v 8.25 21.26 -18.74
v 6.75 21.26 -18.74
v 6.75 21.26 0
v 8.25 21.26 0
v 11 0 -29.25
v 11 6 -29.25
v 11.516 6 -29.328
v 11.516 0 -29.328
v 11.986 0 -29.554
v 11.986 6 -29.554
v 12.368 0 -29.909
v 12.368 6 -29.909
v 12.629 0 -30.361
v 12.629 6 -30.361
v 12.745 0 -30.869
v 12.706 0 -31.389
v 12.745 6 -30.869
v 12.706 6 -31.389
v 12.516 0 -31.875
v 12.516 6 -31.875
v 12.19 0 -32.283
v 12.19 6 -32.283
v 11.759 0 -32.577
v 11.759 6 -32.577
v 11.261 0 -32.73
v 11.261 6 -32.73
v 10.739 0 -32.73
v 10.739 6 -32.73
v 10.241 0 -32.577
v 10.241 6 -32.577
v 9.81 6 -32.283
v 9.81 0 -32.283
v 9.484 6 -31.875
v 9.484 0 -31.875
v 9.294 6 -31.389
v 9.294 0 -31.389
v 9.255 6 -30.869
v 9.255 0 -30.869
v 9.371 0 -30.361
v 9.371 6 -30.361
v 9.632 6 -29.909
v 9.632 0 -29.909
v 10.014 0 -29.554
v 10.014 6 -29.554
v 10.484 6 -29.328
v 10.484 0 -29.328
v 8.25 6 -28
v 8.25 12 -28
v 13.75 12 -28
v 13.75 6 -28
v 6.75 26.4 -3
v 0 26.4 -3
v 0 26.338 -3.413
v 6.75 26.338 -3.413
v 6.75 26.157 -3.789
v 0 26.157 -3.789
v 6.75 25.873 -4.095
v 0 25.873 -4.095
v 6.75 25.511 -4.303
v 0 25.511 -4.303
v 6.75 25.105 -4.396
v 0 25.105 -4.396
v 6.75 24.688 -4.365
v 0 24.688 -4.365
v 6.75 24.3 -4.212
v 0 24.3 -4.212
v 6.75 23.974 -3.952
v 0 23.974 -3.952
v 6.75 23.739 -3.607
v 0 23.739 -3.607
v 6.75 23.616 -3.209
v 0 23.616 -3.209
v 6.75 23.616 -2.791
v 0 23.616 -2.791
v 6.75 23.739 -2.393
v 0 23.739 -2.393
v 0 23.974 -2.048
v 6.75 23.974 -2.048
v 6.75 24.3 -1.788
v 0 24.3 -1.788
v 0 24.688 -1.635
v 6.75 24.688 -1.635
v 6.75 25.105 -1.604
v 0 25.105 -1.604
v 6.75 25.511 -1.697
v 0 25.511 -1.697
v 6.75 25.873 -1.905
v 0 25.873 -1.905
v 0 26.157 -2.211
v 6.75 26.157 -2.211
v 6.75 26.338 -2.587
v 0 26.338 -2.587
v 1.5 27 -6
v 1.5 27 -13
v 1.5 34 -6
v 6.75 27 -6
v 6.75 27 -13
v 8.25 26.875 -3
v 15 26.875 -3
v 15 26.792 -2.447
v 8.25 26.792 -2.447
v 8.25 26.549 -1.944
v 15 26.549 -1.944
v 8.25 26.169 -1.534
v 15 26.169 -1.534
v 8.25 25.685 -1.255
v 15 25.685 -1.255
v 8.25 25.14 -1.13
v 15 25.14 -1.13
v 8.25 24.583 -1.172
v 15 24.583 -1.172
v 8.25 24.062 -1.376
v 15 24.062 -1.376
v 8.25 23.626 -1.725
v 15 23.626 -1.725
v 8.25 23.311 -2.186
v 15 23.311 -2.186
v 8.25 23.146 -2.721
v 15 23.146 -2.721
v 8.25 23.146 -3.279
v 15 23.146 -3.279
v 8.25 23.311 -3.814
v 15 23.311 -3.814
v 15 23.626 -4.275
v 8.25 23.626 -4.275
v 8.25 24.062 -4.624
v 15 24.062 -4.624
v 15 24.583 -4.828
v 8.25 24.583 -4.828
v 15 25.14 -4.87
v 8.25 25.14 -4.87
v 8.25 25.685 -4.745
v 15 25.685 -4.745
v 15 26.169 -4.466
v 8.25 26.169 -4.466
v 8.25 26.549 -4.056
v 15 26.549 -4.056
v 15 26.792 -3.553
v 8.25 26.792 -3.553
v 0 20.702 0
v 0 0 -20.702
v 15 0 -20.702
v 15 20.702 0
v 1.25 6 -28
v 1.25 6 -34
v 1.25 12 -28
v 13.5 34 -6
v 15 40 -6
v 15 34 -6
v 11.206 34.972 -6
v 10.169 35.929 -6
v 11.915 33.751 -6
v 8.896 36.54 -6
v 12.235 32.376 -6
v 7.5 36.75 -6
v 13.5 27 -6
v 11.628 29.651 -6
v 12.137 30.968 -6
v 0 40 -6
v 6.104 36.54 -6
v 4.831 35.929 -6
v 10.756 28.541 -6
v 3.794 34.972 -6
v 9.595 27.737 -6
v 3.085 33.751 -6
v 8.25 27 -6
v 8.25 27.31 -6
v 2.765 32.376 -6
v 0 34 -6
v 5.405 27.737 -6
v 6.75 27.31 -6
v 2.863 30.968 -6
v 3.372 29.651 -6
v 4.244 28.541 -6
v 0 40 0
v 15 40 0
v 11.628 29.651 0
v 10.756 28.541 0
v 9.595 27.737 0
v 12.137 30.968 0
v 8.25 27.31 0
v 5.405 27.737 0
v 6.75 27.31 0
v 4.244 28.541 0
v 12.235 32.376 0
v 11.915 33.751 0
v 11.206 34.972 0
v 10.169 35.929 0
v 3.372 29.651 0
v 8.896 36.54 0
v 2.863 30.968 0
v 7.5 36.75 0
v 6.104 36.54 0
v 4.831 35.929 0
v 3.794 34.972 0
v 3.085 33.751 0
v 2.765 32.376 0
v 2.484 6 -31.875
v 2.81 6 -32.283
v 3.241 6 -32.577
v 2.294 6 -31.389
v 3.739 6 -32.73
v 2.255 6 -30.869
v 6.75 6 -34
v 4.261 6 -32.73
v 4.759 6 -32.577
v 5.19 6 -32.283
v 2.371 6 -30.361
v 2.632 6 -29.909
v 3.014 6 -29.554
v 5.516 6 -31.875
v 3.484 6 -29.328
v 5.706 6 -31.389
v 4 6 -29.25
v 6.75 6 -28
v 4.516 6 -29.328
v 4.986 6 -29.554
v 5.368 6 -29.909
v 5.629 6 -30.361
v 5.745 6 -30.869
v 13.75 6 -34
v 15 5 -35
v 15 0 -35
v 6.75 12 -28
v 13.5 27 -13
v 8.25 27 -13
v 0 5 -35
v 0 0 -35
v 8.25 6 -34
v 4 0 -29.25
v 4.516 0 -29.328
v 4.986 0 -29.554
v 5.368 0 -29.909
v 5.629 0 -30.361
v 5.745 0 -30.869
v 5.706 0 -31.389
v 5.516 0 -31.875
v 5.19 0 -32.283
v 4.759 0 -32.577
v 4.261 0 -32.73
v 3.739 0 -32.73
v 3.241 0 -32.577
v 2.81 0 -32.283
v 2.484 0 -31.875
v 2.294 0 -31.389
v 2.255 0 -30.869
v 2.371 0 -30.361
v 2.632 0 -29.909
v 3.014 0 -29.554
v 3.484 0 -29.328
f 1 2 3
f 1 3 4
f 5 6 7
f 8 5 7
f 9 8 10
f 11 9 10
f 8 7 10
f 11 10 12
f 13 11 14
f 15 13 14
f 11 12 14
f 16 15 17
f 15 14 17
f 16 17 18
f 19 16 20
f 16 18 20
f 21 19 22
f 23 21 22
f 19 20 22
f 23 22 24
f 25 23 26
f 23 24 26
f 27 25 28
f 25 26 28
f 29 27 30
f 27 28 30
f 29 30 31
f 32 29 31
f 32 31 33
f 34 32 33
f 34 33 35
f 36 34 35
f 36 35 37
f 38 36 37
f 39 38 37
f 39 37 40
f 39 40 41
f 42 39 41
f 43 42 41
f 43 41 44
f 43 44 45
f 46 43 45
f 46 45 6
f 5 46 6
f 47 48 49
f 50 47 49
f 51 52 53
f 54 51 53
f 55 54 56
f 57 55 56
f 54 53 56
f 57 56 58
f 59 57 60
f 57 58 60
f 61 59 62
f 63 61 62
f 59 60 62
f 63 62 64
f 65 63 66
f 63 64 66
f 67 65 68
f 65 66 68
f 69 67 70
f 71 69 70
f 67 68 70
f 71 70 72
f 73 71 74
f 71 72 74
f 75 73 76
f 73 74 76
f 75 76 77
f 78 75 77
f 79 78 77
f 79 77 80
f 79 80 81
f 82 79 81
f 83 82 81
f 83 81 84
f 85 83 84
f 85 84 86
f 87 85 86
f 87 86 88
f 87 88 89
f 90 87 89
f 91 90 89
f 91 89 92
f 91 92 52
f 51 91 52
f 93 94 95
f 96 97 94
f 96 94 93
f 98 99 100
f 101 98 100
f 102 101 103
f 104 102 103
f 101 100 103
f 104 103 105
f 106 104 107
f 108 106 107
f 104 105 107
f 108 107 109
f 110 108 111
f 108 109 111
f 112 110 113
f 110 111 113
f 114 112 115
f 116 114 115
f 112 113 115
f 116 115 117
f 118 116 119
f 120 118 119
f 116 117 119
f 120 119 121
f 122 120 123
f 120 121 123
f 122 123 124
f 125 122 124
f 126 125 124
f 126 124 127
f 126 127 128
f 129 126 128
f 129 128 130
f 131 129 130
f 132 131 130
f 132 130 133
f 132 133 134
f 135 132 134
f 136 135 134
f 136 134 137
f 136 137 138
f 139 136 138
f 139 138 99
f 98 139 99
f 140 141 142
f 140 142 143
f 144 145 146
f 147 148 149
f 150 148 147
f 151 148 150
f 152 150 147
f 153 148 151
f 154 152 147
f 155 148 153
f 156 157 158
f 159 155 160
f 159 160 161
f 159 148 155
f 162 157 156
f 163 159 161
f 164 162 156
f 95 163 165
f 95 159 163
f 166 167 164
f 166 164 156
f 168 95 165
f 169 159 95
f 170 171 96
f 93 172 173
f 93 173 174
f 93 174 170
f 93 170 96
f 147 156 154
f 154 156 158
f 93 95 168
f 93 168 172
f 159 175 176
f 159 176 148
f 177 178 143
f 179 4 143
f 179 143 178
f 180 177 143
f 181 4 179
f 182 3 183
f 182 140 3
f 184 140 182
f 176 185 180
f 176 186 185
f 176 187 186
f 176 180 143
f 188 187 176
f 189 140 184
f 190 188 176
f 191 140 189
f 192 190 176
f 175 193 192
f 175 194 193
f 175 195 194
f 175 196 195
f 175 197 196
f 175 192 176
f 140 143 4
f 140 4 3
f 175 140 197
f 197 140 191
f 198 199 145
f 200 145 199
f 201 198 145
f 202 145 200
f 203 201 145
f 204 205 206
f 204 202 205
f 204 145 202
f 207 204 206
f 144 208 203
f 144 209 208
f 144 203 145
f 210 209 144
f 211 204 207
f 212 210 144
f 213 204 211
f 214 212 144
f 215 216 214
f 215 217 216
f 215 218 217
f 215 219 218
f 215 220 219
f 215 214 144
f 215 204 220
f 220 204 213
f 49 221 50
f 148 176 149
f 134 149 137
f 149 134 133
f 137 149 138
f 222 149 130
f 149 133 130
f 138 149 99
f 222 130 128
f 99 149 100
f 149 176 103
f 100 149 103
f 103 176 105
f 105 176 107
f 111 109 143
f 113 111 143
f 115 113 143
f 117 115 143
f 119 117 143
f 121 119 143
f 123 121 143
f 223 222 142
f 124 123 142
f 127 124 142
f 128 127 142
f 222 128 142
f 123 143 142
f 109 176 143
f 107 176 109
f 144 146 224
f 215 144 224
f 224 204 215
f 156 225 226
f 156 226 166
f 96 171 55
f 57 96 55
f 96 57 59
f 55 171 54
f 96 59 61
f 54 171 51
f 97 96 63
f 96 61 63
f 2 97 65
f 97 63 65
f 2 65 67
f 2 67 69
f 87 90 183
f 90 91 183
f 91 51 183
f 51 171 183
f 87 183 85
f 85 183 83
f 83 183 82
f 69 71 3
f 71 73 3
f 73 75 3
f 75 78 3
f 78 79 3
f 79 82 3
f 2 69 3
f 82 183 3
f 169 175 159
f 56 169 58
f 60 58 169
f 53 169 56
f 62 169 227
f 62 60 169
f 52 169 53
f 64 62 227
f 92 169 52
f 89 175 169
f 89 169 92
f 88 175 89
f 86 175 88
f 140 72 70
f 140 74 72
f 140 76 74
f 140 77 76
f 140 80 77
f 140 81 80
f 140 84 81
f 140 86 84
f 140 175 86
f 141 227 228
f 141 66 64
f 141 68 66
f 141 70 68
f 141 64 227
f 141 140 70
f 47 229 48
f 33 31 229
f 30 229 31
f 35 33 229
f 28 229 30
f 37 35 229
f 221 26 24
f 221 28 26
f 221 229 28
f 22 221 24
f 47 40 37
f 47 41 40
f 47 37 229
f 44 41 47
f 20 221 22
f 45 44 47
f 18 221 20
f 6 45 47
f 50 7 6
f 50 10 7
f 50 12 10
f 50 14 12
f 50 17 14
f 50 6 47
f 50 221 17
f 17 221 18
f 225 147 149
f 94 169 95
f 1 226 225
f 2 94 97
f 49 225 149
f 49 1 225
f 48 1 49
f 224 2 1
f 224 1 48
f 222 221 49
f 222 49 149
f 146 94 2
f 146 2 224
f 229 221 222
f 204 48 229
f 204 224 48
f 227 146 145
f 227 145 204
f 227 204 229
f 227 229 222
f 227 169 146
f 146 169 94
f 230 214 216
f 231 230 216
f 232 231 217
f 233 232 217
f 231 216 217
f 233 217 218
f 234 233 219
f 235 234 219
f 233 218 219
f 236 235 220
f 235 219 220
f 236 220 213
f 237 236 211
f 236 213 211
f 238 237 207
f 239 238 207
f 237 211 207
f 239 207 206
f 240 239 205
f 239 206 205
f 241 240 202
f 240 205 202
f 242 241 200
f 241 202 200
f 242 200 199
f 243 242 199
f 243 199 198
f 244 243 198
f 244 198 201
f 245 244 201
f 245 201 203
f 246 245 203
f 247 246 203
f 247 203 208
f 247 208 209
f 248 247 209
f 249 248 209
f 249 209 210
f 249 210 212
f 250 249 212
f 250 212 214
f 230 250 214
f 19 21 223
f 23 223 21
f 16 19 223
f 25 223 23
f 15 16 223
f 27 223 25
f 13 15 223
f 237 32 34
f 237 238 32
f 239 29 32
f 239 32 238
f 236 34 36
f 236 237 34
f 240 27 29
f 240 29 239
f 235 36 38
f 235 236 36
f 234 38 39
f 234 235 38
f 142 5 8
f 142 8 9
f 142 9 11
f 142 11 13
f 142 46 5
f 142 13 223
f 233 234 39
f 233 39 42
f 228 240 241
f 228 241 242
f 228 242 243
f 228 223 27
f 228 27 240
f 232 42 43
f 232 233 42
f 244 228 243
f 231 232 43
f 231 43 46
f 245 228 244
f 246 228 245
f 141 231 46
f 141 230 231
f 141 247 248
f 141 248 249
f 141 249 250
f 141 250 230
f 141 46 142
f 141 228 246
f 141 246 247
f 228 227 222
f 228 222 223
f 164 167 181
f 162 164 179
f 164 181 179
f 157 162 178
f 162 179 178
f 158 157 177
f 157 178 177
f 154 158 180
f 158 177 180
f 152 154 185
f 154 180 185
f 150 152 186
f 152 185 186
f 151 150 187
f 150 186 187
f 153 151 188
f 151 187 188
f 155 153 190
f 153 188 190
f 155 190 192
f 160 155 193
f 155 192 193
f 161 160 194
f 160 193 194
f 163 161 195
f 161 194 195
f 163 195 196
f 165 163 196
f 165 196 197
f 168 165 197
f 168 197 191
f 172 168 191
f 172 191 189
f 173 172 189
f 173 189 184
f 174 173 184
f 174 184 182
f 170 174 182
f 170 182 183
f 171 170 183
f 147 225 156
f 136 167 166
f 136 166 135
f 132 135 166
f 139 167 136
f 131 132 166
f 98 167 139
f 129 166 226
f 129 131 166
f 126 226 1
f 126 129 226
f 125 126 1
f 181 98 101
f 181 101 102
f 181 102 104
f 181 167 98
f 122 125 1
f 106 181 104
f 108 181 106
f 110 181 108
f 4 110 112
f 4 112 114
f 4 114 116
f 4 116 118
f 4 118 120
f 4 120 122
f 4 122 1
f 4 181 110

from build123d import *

# Parameters (mm, degrees)
PAD_DEPTH       = 15
SKETCH001_R     = 4.725
POCKET_DEPTH    = 28.285271
SKETCH002_W     = 13.497765
SKETCH002_H     = 2
POCKET001_DEPTH = 15.001
SKETCH007_W     = 9.919765
SKETCH007_H     = 5.5
SKETCH007_W_2   = 9.427402
POCKET002_DEPTH = 34
SKETCH008_W     = 17.002388
SKETCH008_H     = 12
POCKET003_DEPTH = 13
SKETCH009_R     = 4.75
POCKET004_DEPTH = 35.001
SKETCH010_W     = 8.09575
SKETCH010_H     = 1.5
POCKET005_DEPTH = 35.001
SKETCH011_R     = 1.4
POCKET006_DEPTH = 15.001
SKETCH012_R     = 1.4
POCKET007_DEPTH = 8
SKETCH013_R     = 1.75
POCKET008_DEPTH = 6.001
SKETCH014_R     = 1.875
POCKET009_DEPTH = 8


with BuildPart() as part:
    # Sketch → Pad (new body)
    with BuildSketch(Plane.YZ):
        Polygon((20.701614, 0), (40, 0), (40, -6), (34, -6), (5, -35), (0, -35), (0, -20.701614), align=None)
    extrude(amount=PAD_DEPTH)

    # Sketch001 (on Face4 of Pad) → Pocket (cut, through all)
    with BuildSketch(Plane(origin=(0, 20, -20), x_dir=(0, 0.707107, 0.707107), z_dir=(0, 0.707107, -0.707107))):
        with Locations((-32, 7.5)):
            Circle(SKETCH001_R)
    extrude(amount=-POCKET_DEPTH, mode=Mode.SUBTRACT)

    # Sketch002 (on Face8 of Pocket) → Pocket001 (cut, through all)
    with BuildSketch(Plane(origin=(0, 0, 0), x_dir=(0, 1, 0), z_dir=(-1, 0, 0))):
        with Locations((-21.822522, 7.5)):
            Rectangle(SKETCH002_W, SKETCH002_H)
    extrude(amount=-POCKET001_DEPTH, mode=Mode.SUBTRACT)

    # Sketch007 (on Face2 of Pocket001) → Pocket002 (cut)
    with BuildSketch(Plane.ZX.offset(40)):
        with Locations((-32.959882, 4)):
            Rectangle(SKETCH007_W, SKETCH007_H)
        with Locations((-32.713701, 11)):
            Rectangle(SKETCH007_W_2, SKETCH007_H)
    extrude(amount=-POCKET002_DEPTH, mode=Mode.SUBTRACT)

    # Sketch008 (on Face3 of Pocket002) → Pocket003 (cut)
    with BuildSketch(Plane.ZX.offset(40)):
        with Locations((-14.501194, 7.5)):
            Rectangle(SKETCH008_W, SKETCH008_H)
    extrude(amount=-POCKET003_DEPTH, mode=Mode.SUBTRACT)

    # Sketch009 (on Face1 of Pocket003) → Pocket004 (cut, through all)
    with BuildSketch(Plane(origin=(0, 0, 0), x_dir=(0, -1, 0), z_dir=(0, 0, 1))):
        with Locations((-32, 7.5)):
            Circle(SKETCH009_R)
    extrude(amount=-POCKET004_DEPTH, mode=Mode.SUBTRACT)

    # Sketch010 (on Face1 of Pocket004) → Pocket005 (cut, through all)
    with BuildSketch(Plane(origin=(0, 0, 0), x_dir=(0, -1, 0), z_dir=(0, 0, 1))):
        with Locations((-25.307632, 7.5)):
            Rectangle(SKETCH010_W, SKETCH010_H)
    extrude(amount=-POCKET005_DEPTH, mode=Mode.SUBTRACT)

    # Sketch011 (on Face3 of Pocket005) → Pocket006 (cut, through all)
    with BuildSketch(Plane(origin=(0, 0, 0), x_dir=(0, 1, 0), z_dir=(-1, 0, 0))):
        with Locations((25, 3)):
            Circle(SKETCH011_R)
    extrude(amount=-POCKET006_DEPTH, mode=Mode.SUBTRACT)

    # Sketch012 (on Face3 of Pocket006) → Pocket007 (cut)
    with BuildSketch(Plane(origin=(0, 0, 0), x_dir=(0, 1, 0), z_dir=(-1, 0, 0))):
        with Locations((25, 3)):
            Circle(SKETCH012_R)
    extrude(amount=-POCKET007_DEPTH, mode=Mode.SUBTRACT)

    # Sketch013 (on Face31 of Pocket007) → Pocket008 (cut, through all)
    with BuildSketch(Plane.ZX.offset(6)):
        with Locations((-31, 11)):
            Circle(SKETCH013_R)
        with Locations((-31, 4)):
            Circle(SKETCH013_R)
    extrude(amount=-POCKET008_DEPTH, mode=Mode.SUBTRACT)

    # Sketch014 (on Face4 of Pocket008) → Pocket009 (cut)
    with BuildSketch(Plane.YZ.offset(15)):
        with Locations((25, -3)):
            Circle(SKETCH014_R)
    extrude(amount=-POCKET009_DEPTH, mode=Mode.SUBTRACT)


solid = part.part
